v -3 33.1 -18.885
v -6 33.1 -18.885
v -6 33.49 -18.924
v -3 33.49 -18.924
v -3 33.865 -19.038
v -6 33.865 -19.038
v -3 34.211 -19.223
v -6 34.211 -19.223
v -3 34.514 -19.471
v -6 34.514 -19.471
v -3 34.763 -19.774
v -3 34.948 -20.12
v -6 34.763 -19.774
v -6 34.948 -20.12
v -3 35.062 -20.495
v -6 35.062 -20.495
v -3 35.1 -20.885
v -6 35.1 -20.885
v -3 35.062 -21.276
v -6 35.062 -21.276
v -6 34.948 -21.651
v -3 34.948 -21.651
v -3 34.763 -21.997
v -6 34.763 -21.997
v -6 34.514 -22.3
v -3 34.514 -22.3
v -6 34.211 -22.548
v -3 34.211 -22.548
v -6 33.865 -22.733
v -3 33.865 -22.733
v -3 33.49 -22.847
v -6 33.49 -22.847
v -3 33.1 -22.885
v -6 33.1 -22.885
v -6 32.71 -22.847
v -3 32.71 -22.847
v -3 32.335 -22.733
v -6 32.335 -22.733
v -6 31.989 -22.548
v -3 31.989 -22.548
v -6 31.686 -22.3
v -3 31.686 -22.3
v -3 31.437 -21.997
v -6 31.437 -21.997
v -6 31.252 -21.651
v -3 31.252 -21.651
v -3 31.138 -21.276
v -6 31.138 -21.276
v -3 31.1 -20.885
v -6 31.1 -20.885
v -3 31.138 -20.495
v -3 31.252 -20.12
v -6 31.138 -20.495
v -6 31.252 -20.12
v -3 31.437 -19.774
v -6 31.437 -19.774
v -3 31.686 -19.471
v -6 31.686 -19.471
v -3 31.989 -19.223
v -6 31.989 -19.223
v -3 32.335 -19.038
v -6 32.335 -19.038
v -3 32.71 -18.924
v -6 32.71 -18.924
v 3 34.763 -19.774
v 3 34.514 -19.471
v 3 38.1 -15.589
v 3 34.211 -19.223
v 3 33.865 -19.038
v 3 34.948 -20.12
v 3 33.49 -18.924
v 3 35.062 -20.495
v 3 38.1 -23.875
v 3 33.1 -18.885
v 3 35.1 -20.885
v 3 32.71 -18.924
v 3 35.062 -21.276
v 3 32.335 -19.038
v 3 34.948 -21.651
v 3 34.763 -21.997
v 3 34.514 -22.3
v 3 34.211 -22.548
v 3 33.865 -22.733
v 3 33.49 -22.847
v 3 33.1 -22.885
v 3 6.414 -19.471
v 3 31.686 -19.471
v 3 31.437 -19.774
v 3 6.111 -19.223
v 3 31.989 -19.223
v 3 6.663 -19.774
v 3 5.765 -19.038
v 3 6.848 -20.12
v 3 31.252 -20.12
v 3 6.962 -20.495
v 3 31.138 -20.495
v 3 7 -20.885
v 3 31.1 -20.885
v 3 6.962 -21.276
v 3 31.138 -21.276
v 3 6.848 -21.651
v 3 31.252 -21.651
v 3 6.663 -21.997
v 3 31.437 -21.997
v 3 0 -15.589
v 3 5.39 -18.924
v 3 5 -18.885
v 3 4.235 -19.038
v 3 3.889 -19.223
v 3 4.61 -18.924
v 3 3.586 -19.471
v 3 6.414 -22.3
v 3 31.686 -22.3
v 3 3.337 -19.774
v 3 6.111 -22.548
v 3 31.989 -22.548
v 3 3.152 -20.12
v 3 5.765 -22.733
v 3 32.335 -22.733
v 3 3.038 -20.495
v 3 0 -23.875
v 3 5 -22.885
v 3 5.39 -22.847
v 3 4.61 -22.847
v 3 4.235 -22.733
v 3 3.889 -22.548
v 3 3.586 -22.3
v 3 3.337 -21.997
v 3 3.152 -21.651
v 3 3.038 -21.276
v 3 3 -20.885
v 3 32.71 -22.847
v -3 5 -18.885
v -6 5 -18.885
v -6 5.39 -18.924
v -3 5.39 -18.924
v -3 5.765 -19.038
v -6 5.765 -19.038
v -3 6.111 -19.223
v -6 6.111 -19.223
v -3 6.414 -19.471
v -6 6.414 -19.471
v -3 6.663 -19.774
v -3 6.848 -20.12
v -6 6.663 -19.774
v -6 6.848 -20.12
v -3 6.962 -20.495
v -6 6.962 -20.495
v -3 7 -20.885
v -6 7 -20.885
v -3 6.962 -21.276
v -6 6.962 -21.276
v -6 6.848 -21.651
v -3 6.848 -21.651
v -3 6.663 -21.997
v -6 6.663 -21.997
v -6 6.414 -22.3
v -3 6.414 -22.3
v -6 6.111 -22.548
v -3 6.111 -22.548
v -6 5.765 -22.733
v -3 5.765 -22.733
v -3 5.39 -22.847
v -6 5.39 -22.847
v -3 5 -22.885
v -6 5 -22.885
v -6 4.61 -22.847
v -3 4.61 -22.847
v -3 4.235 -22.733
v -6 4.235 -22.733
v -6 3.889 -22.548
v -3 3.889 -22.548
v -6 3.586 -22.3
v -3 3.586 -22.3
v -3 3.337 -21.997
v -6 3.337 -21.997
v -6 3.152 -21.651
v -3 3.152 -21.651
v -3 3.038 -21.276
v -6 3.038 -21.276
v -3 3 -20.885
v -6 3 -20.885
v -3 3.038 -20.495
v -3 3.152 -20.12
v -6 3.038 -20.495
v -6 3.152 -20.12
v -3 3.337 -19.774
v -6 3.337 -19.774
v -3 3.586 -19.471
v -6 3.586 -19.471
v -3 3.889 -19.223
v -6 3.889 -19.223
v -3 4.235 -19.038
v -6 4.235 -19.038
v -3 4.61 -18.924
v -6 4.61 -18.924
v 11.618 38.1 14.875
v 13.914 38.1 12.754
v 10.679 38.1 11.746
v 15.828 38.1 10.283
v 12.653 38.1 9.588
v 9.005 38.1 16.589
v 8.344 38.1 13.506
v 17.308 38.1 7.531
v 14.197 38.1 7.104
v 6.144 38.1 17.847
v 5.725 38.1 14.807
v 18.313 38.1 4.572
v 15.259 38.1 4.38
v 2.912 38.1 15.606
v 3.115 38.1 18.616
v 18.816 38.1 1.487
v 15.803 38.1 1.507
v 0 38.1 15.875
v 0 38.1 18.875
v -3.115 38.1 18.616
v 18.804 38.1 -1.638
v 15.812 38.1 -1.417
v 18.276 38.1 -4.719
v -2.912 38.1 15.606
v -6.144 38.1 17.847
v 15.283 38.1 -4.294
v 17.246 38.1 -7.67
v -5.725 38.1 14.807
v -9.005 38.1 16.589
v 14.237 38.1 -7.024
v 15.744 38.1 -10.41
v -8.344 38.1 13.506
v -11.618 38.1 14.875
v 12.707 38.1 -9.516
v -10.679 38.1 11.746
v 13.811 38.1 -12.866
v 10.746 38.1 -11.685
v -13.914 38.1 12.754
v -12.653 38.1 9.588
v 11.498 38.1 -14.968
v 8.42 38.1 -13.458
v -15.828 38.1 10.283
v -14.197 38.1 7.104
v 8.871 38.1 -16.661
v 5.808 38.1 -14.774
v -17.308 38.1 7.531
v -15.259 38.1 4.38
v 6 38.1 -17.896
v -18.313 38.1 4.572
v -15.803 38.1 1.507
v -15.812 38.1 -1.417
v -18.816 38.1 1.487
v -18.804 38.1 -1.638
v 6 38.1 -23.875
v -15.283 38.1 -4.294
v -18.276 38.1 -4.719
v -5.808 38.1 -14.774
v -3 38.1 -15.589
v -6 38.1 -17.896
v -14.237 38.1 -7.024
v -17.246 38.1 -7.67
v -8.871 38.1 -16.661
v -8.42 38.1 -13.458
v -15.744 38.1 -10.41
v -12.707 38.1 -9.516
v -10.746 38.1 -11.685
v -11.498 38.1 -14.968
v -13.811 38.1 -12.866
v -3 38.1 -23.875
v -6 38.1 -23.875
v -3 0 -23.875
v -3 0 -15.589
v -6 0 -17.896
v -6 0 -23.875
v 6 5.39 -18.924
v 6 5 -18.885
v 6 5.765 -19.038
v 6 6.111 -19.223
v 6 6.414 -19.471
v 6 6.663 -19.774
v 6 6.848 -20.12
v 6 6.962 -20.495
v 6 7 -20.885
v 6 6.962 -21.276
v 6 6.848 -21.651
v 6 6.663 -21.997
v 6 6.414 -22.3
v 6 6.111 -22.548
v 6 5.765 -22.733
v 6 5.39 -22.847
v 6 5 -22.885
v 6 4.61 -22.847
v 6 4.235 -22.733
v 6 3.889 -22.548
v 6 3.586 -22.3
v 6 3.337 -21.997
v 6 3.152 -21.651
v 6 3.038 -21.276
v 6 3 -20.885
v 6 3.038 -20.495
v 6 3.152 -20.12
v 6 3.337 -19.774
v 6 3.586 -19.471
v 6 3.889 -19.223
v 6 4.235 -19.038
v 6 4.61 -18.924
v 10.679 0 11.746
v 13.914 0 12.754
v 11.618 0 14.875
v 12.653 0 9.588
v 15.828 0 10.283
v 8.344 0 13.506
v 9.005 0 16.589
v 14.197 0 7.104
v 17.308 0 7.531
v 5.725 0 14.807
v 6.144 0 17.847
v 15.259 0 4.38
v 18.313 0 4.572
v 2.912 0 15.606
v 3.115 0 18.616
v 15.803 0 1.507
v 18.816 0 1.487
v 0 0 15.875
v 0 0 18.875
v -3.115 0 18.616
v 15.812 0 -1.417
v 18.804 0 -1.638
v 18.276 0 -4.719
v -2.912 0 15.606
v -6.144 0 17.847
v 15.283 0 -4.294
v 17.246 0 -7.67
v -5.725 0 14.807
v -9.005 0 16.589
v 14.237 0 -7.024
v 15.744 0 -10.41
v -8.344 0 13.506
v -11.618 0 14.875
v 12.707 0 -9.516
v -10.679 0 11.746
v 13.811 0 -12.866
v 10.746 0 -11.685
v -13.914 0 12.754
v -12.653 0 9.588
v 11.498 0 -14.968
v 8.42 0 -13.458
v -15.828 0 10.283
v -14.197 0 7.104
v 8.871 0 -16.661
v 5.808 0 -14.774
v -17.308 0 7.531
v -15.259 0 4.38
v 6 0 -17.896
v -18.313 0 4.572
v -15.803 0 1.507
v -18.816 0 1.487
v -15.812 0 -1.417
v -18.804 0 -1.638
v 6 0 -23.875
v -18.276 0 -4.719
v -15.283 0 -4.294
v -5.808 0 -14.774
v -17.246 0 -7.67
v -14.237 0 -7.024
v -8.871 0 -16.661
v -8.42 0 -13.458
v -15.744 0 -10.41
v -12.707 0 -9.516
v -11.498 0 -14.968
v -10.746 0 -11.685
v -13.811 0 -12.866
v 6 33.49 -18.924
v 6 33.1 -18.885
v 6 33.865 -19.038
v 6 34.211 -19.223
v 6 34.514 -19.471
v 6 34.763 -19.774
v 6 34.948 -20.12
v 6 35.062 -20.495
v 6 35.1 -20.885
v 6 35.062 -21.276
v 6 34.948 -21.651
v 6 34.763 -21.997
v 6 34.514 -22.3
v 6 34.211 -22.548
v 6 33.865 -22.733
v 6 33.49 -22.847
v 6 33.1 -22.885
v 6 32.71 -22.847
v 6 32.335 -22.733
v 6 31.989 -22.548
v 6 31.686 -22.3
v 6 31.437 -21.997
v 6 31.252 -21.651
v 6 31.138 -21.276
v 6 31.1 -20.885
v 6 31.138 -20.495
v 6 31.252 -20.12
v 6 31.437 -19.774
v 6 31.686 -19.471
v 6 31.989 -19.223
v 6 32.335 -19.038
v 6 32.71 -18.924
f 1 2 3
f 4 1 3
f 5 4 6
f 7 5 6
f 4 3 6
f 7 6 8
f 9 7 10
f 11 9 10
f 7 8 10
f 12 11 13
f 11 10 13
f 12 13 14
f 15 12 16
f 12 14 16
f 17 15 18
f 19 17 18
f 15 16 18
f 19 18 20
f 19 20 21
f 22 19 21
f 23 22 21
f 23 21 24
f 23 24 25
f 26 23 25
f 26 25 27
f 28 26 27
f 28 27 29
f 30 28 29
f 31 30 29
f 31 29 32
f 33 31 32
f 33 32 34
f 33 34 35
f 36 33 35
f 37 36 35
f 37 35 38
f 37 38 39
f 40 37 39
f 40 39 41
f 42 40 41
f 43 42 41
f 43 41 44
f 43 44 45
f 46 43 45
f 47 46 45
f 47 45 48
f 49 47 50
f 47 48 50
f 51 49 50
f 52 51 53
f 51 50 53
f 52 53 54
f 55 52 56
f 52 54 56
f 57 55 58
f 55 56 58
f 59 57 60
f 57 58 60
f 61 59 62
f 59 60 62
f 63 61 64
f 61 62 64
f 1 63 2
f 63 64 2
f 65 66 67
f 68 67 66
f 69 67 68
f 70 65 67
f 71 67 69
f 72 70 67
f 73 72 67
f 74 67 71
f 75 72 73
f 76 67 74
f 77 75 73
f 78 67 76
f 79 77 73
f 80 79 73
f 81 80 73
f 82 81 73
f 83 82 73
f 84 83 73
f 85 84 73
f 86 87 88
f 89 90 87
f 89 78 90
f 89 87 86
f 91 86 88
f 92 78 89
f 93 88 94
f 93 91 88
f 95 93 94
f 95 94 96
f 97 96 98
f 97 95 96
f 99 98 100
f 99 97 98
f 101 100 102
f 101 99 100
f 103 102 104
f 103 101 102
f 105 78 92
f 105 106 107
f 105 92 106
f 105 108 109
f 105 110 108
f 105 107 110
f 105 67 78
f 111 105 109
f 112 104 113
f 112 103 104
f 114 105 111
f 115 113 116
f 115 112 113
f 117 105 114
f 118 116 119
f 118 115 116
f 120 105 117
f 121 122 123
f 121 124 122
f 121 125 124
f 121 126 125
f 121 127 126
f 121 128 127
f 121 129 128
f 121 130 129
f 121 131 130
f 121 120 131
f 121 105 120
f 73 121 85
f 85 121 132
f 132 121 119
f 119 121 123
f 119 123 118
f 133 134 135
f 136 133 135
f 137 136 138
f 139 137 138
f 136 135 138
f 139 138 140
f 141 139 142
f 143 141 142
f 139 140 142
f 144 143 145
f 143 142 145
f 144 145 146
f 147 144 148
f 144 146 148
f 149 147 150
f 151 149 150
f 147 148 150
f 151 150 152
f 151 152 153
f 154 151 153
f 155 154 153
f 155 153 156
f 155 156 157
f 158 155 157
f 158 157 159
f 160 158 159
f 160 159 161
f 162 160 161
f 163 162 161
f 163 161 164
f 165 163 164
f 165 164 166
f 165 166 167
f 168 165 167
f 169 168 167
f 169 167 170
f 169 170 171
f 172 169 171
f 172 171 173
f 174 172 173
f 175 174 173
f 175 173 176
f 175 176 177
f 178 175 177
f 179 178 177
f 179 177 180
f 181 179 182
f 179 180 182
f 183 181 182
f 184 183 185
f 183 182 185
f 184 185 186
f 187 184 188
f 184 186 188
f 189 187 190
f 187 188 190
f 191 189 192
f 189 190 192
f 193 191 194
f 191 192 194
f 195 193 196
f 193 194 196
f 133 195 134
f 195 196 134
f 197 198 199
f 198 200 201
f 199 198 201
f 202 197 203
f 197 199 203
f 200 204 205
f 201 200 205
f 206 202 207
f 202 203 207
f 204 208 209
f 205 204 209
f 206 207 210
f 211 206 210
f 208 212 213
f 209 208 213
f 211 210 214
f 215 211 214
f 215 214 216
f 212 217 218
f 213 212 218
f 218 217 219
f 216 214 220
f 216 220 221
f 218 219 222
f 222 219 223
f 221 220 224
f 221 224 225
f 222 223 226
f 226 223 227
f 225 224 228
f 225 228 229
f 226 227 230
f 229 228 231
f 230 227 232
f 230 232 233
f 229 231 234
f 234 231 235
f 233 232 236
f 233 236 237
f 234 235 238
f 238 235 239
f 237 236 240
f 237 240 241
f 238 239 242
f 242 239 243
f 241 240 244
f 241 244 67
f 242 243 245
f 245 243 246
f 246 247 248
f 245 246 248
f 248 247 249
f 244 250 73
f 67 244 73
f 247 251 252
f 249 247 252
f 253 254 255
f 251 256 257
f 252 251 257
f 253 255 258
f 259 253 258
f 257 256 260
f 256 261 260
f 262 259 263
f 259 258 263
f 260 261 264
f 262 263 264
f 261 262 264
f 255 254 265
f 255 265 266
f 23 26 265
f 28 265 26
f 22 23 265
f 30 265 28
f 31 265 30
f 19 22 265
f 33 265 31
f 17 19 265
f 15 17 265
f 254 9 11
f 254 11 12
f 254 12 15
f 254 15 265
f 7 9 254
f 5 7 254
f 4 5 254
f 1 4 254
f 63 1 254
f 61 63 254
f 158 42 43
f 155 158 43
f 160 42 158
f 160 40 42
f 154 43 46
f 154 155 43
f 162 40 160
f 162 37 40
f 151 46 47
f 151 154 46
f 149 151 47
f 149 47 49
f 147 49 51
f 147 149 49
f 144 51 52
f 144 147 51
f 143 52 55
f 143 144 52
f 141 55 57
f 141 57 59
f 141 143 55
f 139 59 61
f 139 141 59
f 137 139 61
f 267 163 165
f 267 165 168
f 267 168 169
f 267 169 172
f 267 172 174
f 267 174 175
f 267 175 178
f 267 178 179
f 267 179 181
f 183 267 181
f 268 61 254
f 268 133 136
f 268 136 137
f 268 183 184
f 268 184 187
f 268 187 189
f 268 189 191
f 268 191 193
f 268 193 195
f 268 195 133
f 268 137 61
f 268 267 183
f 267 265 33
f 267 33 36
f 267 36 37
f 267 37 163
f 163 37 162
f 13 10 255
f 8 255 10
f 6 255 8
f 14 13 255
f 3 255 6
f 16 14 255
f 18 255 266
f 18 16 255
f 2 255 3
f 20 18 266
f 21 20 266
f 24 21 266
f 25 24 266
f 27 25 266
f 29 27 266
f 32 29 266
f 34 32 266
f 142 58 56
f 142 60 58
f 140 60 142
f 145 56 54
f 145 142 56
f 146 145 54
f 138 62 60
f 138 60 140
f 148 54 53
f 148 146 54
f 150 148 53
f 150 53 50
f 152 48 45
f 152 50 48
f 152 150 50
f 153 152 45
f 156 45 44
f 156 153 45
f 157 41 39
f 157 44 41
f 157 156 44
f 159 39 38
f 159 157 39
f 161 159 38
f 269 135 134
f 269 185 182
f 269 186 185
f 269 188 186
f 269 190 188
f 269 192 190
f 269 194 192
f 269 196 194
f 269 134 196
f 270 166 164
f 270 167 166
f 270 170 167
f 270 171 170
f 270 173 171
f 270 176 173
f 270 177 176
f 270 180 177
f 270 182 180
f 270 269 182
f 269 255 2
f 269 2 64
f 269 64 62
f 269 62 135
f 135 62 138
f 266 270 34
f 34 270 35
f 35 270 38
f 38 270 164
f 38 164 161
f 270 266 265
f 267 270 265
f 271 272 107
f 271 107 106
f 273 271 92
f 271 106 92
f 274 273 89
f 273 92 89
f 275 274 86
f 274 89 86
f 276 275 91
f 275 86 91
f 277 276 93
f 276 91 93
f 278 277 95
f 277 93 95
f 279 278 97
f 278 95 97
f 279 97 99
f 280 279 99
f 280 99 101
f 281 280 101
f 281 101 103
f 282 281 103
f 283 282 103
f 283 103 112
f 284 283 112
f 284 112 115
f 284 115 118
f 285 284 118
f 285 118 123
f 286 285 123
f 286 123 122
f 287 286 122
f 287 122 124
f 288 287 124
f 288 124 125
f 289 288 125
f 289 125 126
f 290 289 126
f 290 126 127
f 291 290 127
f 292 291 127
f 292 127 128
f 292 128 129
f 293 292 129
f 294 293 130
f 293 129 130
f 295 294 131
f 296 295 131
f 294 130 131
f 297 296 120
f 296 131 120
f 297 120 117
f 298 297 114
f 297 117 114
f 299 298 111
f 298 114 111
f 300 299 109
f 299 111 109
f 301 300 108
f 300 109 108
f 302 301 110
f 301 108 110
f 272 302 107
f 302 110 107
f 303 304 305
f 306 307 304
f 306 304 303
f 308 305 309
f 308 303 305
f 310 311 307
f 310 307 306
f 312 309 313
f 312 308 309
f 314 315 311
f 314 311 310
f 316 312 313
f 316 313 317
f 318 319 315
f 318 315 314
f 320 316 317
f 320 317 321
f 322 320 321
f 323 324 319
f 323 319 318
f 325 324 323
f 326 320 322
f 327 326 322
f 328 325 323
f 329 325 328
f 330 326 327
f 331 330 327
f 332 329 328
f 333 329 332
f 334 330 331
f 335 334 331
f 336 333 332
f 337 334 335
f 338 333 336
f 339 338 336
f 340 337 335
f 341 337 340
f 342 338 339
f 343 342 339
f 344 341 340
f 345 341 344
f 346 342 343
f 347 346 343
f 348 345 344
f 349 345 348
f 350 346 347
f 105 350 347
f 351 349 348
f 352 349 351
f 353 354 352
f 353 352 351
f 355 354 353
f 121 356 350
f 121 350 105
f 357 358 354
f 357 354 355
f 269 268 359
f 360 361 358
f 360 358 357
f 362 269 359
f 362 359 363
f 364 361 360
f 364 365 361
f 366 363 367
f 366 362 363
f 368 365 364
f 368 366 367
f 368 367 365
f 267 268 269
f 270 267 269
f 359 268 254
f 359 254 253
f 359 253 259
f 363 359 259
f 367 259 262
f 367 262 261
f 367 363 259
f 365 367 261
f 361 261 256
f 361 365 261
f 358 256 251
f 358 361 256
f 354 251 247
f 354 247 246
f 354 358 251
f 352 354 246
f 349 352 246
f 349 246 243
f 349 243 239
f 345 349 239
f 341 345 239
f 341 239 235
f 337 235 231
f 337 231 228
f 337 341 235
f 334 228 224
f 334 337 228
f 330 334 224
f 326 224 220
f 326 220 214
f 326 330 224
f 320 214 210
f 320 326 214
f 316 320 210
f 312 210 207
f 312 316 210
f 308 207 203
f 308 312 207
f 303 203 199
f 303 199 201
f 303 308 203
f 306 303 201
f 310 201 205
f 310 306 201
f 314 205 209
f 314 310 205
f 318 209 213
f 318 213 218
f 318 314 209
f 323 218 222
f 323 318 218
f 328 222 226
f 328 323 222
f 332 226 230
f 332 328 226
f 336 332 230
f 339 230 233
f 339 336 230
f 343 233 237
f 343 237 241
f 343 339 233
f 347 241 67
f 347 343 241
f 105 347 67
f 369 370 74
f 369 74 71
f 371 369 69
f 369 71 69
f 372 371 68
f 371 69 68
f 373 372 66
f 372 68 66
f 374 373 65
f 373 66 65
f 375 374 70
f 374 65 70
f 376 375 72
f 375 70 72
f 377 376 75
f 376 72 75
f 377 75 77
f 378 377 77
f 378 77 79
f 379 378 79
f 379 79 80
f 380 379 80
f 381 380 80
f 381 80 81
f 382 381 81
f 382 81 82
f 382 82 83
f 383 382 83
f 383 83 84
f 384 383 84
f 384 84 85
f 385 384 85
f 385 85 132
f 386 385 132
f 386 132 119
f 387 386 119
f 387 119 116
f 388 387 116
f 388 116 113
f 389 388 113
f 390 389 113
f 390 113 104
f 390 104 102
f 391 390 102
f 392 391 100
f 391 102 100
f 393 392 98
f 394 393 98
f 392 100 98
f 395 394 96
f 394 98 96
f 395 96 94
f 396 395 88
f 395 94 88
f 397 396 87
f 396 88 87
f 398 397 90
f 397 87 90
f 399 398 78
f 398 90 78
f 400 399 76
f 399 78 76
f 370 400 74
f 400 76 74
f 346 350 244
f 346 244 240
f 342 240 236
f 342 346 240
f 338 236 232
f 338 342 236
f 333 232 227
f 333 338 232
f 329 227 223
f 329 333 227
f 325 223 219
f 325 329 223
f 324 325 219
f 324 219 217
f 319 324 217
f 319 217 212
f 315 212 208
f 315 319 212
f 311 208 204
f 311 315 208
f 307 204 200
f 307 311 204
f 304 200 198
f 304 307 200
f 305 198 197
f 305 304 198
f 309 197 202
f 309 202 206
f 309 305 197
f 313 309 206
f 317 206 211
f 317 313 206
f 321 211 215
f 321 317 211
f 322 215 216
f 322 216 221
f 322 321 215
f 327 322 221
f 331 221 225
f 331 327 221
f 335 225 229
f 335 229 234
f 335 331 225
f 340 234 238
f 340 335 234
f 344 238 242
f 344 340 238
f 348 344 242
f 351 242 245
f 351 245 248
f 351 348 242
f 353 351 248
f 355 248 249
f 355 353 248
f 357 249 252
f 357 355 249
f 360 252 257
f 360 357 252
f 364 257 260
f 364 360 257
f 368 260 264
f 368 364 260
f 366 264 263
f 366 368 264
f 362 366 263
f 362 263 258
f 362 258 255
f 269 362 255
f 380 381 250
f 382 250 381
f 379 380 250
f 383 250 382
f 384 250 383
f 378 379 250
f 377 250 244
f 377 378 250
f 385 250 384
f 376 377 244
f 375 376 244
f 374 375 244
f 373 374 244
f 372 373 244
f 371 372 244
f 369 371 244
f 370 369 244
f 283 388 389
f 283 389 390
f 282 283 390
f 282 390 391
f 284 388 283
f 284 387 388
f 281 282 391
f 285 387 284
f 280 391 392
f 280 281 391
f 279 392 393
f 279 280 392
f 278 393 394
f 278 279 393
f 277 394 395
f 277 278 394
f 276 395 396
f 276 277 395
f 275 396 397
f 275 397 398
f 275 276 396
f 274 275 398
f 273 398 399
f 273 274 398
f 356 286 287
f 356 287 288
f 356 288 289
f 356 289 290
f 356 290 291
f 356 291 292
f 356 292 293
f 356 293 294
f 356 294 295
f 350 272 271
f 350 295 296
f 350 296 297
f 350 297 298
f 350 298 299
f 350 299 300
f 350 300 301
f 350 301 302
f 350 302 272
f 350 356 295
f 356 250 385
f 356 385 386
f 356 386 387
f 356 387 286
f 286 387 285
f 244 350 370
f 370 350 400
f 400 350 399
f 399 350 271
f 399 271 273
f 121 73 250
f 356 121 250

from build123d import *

# Parameters (mm, degrees)
BOSS_EXTRUDE1_DEPTH = 38.1
SKETCH2_R           = 2
CUT_EXTRUDE1_DEPTH  = 52.38473752


with BuildPart() as part:
    # Sketch1 → Boss-Extrude1 (new body)
    with BuildSketch(Plane(origin=(0, 0, 0), x_dir=(1, 0, 0), z_dir=(0, 1, 0))):
        with BuildLine():
            Line((3, 15.875), (3, 23.875))
            Line((3, 23.875), (6, 23.875))
            Line((6, 23.875), (6, 17.895966724))
            ThreePointArc((6, 17.895966724), (0, -18.875), (-6, 17.895966724))
            Line((-6, 17.895966724), (-6, 23.875))
            Line((-6, 23.875), (-3, 23.875))
            Line((-3, 23.875), (-3, 15.875))
            Line((-3, 15.875), (-3, 15.588958432))
            ThreePointArc((-3, 15.588958432), (0, -15.875), (3, 15.588958432))
            Line((3, 15.588958432), (3, 15.875))
        make_face()
    extrude(amount=BOSS_EXTRUDE1_DEPTH)

    # Sketch2 → Cut-Extrude1 (cut, through all)
    with BuildSketch(Plane.ZY.offset(6)):
        with Locations((-20.885483362, 33.1)):
            Circle(SKETCH2_R)
        with Locations((-20.885483362, 5)):
            Circle(SKETCH2_R)
    extrude(amount=-CUT_EXTRUDE1_DEPTH, mode=Mode.SUBTRACT)


solid = part.part
